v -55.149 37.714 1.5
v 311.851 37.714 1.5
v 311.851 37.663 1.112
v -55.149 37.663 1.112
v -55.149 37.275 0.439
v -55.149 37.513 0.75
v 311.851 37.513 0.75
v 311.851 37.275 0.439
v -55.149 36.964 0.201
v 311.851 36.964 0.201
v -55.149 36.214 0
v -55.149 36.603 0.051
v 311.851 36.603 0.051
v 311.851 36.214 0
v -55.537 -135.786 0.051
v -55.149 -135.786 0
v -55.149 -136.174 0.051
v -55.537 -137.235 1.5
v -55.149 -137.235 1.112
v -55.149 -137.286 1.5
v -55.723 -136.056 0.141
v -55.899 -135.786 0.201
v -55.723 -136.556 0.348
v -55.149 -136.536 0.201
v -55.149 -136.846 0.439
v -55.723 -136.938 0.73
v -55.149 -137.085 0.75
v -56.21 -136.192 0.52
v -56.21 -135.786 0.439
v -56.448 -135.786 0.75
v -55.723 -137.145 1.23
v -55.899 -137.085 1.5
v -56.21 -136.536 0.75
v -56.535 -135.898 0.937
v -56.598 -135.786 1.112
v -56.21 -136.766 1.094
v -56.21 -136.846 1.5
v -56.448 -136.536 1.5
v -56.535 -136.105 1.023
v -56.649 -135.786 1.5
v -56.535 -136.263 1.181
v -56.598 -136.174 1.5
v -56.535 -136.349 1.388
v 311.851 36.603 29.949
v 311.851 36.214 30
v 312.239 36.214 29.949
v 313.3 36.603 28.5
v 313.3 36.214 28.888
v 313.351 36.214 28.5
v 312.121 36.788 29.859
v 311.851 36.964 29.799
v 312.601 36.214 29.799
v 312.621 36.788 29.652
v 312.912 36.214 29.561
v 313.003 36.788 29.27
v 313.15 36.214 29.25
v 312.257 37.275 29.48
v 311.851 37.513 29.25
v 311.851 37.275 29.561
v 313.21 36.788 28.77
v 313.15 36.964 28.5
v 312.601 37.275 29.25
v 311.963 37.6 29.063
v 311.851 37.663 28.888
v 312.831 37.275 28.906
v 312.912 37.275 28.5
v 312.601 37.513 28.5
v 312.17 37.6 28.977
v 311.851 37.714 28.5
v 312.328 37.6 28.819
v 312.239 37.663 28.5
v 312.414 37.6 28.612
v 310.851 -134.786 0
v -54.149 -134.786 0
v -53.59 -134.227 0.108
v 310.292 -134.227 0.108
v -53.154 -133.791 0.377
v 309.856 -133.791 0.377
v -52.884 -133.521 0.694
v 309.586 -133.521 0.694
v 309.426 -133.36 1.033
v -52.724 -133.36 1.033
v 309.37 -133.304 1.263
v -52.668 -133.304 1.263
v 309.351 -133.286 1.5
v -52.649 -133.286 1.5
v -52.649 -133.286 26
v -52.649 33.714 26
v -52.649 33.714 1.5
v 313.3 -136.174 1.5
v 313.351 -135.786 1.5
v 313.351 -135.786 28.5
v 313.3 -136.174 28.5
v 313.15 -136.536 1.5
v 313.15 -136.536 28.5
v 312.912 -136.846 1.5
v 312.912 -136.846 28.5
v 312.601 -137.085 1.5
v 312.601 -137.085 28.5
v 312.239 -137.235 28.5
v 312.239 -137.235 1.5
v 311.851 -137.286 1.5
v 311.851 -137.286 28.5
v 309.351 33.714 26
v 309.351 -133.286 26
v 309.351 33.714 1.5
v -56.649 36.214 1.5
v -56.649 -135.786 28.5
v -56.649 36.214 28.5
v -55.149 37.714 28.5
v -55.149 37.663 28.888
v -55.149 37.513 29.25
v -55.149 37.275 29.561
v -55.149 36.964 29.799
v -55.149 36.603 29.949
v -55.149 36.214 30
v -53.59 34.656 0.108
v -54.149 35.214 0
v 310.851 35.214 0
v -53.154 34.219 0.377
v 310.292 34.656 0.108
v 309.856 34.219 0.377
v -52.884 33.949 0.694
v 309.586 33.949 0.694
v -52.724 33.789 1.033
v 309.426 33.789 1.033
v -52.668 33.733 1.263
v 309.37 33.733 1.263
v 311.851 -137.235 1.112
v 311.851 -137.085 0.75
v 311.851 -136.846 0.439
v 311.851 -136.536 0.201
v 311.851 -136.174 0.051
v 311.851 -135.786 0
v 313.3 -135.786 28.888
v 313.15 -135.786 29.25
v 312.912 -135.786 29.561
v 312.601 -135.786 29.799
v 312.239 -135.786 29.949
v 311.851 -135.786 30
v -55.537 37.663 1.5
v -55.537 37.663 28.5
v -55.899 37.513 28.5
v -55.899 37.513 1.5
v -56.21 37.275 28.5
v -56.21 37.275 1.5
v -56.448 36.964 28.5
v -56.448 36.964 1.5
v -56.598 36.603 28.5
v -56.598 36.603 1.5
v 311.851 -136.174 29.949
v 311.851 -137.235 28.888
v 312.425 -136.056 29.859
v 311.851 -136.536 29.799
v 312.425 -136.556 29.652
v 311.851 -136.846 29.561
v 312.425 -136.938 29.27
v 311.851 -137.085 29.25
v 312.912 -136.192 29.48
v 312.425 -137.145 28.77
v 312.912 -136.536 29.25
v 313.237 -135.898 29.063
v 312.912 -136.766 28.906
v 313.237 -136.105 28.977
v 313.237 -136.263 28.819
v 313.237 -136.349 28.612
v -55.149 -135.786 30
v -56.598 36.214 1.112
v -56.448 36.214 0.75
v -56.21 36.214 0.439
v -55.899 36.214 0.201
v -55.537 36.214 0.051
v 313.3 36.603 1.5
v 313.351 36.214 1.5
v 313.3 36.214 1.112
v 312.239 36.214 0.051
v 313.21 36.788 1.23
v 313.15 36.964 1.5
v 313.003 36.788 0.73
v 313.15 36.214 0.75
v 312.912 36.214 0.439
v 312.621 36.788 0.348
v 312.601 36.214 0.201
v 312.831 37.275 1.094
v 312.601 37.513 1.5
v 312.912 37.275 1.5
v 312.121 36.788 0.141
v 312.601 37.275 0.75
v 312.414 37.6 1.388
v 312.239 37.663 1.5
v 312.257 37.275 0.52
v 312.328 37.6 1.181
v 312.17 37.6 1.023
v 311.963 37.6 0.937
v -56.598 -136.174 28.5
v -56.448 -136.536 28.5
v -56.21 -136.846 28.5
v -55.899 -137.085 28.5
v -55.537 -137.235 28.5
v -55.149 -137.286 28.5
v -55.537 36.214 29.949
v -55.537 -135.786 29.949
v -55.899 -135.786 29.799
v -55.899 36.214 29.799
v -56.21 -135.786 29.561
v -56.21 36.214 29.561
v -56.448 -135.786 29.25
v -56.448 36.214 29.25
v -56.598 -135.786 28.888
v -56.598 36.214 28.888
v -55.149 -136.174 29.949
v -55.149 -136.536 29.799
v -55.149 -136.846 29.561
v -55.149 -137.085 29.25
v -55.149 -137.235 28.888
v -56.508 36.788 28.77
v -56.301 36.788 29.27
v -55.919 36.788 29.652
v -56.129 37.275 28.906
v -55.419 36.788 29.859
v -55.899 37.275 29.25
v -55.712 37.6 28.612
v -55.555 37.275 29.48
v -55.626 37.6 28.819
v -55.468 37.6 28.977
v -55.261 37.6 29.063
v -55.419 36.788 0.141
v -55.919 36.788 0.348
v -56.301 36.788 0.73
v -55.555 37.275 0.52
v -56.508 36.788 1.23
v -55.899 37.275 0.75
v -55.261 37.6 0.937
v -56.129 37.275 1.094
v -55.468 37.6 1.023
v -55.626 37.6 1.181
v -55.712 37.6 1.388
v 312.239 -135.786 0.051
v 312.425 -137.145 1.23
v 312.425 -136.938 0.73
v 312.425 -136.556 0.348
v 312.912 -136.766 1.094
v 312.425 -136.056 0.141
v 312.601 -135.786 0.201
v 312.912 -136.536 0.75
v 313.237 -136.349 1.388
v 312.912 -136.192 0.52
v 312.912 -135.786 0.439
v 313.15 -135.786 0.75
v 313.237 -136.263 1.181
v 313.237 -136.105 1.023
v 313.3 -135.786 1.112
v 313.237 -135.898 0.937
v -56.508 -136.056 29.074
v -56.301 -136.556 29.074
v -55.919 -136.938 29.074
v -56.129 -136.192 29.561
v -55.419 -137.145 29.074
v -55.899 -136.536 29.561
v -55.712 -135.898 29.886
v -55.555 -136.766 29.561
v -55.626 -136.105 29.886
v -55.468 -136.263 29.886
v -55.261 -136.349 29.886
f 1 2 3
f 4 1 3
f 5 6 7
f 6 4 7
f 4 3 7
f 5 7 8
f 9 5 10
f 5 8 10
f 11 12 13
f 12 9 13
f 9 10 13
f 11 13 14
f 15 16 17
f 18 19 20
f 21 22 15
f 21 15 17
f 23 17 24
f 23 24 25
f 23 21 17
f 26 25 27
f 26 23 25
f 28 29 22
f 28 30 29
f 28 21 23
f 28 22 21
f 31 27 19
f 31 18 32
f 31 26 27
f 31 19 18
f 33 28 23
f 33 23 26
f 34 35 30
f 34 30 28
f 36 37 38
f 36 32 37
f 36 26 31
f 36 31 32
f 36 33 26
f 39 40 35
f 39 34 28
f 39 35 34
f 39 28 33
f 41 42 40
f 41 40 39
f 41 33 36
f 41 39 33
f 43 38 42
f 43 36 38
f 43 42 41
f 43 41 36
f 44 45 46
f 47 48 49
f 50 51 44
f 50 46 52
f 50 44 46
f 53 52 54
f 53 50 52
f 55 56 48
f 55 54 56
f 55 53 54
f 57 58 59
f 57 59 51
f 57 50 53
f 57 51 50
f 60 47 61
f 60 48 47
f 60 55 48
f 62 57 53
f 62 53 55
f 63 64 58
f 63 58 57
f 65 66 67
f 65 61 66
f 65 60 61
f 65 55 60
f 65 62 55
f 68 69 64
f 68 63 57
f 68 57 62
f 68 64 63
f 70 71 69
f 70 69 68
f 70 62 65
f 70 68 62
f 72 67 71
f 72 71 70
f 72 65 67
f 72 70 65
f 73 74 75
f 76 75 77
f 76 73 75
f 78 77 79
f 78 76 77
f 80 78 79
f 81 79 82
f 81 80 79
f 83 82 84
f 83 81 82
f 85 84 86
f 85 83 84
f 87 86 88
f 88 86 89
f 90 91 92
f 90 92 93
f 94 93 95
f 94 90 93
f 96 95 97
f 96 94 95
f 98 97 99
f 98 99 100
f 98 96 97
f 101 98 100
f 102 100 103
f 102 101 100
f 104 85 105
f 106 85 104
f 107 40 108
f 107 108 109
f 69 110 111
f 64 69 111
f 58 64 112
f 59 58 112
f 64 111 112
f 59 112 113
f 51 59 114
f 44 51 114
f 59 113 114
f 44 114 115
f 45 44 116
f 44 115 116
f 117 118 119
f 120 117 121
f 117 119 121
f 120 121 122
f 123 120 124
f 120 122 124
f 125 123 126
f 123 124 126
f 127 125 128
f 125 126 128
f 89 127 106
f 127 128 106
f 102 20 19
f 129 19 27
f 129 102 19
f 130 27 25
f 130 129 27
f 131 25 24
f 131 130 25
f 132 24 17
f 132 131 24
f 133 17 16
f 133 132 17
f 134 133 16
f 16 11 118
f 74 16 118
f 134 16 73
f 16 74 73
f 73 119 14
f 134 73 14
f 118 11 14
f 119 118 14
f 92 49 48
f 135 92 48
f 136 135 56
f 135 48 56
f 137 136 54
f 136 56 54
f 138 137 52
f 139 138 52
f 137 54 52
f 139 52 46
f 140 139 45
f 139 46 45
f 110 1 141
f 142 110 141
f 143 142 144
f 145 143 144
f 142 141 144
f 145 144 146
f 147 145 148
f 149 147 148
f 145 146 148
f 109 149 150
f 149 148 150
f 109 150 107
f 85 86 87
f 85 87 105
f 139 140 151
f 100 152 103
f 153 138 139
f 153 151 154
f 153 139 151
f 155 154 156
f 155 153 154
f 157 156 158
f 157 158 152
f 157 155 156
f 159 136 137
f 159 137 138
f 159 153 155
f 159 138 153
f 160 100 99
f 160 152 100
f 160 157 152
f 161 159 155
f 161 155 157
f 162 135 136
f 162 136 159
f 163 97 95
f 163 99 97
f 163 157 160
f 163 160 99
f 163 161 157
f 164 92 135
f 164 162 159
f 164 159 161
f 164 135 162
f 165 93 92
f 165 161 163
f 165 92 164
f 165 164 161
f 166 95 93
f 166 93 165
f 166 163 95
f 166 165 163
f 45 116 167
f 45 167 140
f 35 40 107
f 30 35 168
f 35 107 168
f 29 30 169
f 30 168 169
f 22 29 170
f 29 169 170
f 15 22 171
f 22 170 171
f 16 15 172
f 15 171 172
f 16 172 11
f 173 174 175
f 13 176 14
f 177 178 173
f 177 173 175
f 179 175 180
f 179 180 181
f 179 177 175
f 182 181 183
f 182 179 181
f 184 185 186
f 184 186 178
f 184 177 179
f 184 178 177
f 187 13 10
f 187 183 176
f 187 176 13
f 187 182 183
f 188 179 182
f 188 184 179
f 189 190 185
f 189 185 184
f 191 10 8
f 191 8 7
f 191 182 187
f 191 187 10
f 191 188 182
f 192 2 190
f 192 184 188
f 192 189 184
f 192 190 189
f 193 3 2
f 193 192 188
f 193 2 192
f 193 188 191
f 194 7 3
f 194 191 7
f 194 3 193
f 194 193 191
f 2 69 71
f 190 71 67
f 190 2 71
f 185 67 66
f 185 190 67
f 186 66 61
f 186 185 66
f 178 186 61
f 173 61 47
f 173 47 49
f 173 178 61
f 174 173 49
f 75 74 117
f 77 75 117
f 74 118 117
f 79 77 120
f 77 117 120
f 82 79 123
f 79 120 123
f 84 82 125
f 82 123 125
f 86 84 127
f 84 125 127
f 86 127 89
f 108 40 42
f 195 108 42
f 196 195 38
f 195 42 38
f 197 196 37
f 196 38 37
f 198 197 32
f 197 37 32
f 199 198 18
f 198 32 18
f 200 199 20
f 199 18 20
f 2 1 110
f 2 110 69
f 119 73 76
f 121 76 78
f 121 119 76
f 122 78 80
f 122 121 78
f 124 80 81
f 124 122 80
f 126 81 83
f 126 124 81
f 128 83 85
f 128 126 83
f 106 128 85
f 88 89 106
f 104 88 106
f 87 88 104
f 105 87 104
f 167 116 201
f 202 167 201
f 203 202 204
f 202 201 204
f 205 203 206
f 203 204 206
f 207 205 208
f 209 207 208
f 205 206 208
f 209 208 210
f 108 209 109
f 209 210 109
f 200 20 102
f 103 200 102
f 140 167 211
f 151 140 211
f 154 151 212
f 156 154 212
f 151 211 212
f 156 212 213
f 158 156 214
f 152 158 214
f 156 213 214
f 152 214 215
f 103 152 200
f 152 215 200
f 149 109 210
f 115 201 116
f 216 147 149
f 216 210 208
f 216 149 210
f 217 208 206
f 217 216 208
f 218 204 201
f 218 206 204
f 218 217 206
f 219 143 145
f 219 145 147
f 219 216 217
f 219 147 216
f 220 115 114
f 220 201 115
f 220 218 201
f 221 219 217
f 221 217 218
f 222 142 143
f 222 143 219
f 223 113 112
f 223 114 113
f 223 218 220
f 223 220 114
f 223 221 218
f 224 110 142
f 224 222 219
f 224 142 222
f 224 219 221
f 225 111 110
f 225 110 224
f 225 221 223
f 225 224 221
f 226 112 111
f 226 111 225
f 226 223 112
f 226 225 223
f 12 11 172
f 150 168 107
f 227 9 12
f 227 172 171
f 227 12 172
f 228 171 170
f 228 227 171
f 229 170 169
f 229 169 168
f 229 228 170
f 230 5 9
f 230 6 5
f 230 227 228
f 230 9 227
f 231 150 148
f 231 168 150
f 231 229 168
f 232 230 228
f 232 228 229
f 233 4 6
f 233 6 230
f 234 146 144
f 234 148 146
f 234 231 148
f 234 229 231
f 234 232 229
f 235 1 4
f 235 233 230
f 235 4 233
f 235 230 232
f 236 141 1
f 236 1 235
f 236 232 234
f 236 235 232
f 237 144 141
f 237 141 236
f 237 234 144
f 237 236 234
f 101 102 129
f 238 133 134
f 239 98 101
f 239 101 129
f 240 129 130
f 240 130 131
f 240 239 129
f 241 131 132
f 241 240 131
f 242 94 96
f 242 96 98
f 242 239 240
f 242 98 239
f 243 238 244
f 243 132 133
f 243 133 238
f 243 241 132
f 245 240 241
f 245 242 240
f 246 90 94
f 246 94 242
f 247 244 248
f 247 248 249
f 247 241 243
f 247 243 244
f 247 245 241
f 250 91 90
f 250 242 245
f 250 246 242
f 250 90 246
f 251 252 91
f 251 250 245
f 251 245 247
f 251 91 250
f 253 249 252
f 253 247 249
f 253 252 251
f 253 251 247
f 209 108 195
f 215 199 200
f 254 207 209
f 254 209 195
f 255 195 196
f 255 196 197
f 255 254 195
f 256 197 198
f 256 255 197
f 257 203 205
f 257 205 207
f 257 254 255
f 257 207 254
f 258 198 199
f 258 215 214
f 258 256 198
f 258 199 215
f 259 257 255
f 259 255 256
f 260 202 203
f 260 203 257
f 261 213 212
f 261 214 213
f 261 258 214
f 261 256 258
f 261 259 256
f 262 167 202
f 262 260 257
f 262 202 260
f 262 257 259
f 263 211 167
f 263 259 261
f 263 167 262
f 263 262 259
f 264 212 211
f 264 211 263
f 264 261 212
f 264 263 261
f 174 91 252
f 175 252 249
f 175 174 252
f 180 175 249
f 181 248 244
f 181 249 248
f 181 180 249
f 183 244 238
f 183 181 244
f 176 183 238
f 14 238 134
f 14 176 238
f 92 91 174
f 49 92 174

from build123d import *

# Parameters (mm, degrees)
F0_W         = 370
F0_H         = 175
F1_DEPTH     = 30
F2_T         = -4
F3_R         = 1.5
F4_T1_DEPTH  = 172
F4_T3_DEPTH  = 27
F4_T5_DEPTH  = 367
F4_S9_W      = 1.5
F4_S9_H      = 1.5
F4_T10_DEPTH = 1.5
F4_S15_W     = 1.5
F4_S15_H     = 1.5
F4_T16_DEPTH = 1.5
F4_S21_W     = 1.5
F4_S21_H     = 1.5
F4_T22_DEPTH = 1.5
F4_S27_W     = 1.5
F4_S27_H     = 1.5
F4_T28_DEPTH = 1.5
F4_S33_W     = 1.5
F4_S33_H     = 1.5
F4_T34_DEPTH = 1.5
F4_S39_W     = 1.5
F4_S39_H     = 1.5
F4_T40_DEPTH = 1.5
F4_S45_W     = 1.5
F4_S45_H     = 1.5
F4_T46_DEPTH = 1.5
F4_S51_W     = 1.5
F4_S51_H     = 1.5
F4_T52_DEPTH = 1.5


# Not quite as in the source:
# - a fillet or chamfer that OpenCascade refuses, or shapes differently, is made with other operations: its cross-section is extruded or revolved along the edge and cut away or added


with BuildPart() as f1:
    # F0 (on Top) → F1 (new body)
    with BuildSketch(Plane.XY):
        with Locations((128.3509446681, -49.7856229544)):
            Rectangle(F0_W, F0_H)
    extrude(amount=F1_DEPTH)

    # F2
    f2_openings = [f1.faces().sort_by_distance(p)[0] for p in [
        (128.350945, -49.785623, 0),
    ]]
    offset(amount=F2_T, openings=f2_openings)

    # F3
    f3_edges = [f1.edges().sort_by_distance(p)[0] for p in [
        (128.350945, -137.285623, 0),
        (-56.649055, -49.785623, 0),
        (-52.649055, -49.785623, 0),
        (128.350945, -133.285623, 0),
        (128.350945, 37.714377, 0),
        (128.350945, 33.714377, 0),
        (309.350945, -49.785623, 0),
        (313.350945, -49.785623, 0),
    ]]
    fillet(f3_edges, radius=F3_R)

    # F4: fillet of radius 1.5 on 8 edges, made by hand

    # F4_s2 → F4_t1 (cut)
    with BuildSketch(Plane.XZ.offset(-36.2143770456)):
        with BuildLine():
            ThreePointArc((-55.1490553319, 30), (-56.2097155037, 29.5606601718), (-56.6490553319, 28.5))
            Line((-56.6490553319, 28.5), (-56.6490553319, 30))
            Line((-56.6490553319, 30), (-55.1490553319, 30))
        make_face()
        with BuildLine():
            ThreePointArc((313.3509446681, 28.5), (312.9116048398, 29.5606601718), (311.8509446681, 30))
            Line((311.8509446681, 30), (313.3509446681, 30))
            Line((313.3509446681, 30), (313.3509446681, 28.5))
        make_face()
    extrude(amount=F4_T1_DEPTH, mode=Mode.SUBTRACT)

    # F4_s4 → F4_t3 (cut)
    with BuildSketch(Plane.XY.offset(1.5)):
        with BuildLine():
            ThreePointArc((-55.1490553319, 37.7143770456), (-56.2097155037, 37.2750372174), (-56.6490553319, 36.2143770456))
            Line((-56.6490553319, 36.2143770456), (-56.6490553319, 37.7143770456))
            Line((-56.6490553319, 37.7143770456), (-55.1490553319, 37.7143770456))
        make_face()
        with BuildLine():
            ThreePointArc((-56.6490553319, -135.7856229544), (-56.2097155037, -136.8462831261), (-55.1490553319, -137.2856229544))
            Line((-55.1490553319, -137.2856229544), (-56.6490553319, -137.2856229544))
            Line((-56.6490553319, -137.2856229544), (-56.6490553319, -135.7856229544))
        make_face()
        with BuildLine():
            ThreePointArc((313.3509446681, -135.7856229544), (312.9116048398, -136.8462831261), (311.8509446681, -137.2856229544))
            Line((311.8509446681, -137.2856229544), (313.3509446681, -137.2856229544))
            Line((313.3509446681, -137.2856229544), (313.3509446681, -135.7856229544))
        make_face()
        with BuildLine():
            ThreePointArc((311.8509446681, 37.7143770456), (312.9116048398, 37.2750372174), (313.3509446681, 36.2143770456))
            Line((313.3509446681, 36.2143770456), (313.3509446681, 37.7143770456))
            Line((313.3509446681, 37.7143770456), (311.8509446681, 37.7143770456))
        make_face()
    extrude(amount=F4_T3_DEPTH, mode=Mode.SUBTRACT)

    # F4_s6 → F4_t5 (cut)
    with BuildSketch(Plane.YZ.offset(-55.1490553319)):
        with BuildLine():
            ThreePointArc((-135.7856229544, 30), (-136.8462831261, 29.5606601718), (-137.2856229544, 28.5))
            Line((-137.2856229544, 28.5), (-137.2856229544, 30))
            Line((-137.2856229544, 30), (-135.7856229544, 30))
        make_face()
        with BuildLine():
            ThreePointArc((37.7143770456, 28.5), (37.2750372174, 29.5606601718), (36.2143770456, 30))
            Line((36.2143770456, 30), (37.7143770456, 30))
            Line((37.7143770456, 30), (37.7143770456, 28.5))
        make_face()
    extrude(amount=F4_T5_DEPTH, mode=Mode.SUBTRACT)


with BuildPart() as f4_tool8:
    # F4_s9 → F4_t10 (new body)
    with BuildSketch(Plane.XZ.offset(-36.2143770456)):
        with Locations((312.6009446681, 0.75)):
            Rectangle(F4_S9_W, F4_S9_H)
    extrude(amount=-F4_T10_DEPTH)

    # F4_s11 → F4_t12 (revolve, cut)
    with BuildSketch(Plane(origin=(311.8509446681, 36.2143770456, 1.5), x_dir=(-0.7071067812, 0, 0.7071067812), z_dir=(-0.7071067812, 0, -0.7071067812))):
        with BuildLine():
            ThreePointArc((0, -1.5), (1.5, 0), (0, 1.5))
            Line((0, 1.5), (0, -1.5))
        make_face()
    revolve(axis=Axis((311.8509446681, 36.2143770456, 1.5), (0, 1, 0)), mode=Mode.SUBTRACT)


with BuildPart() as f1_1:
    add(f1.part)

    # F4_t7: cut F4_tool8
    add(f4_tool8.part, mode=Mode.SUBTRACT)


with BuildPart() as f4_tool14:
    # F4_s15 → F4_t16 (new body)
    with BuildSketch(Plane.YZ.offset(311.8509446681)):
        with Locations((-136.5356229544, 0.75)):
            Rectangle(F4_S15_W, F4_S15_H)
    extrude(amount=F4_T16_DEPTH)

    # F4_s17 → F4_t18 (revolve, cut)
    with BuildSketch(Plane(origin=(311.8509446681, -135.7856229544, 1.5), x_dir=(0, 0.7071067812, 0.7071067812), z_dir=(0, 0.7071067812, -0.7071067812))):
        with BuildLine():
            ThreePointArc((0, -1.5), (1.5, 0), (0, 1.5))
            Line((0, 1.5), (0, -1.5))
        make_face()
    revolve(axis=Axis((311.8509446681, -135.7856229544, 1.5), (1, 0, 0)), mode=Mode.SUBTRACT)


with BuildPart() as f1_2:
    add(f1_1.part)

    # F4_t13: cut F4_tool14
    add(f4_tool14.part, mode=Mode.SUBTRACT)


with BuildPart() as f4_tool20:
    # F4_s21 → F4_t22 (new body)
    with BuildSketch(Plane.YZ.offset(-55.1490553319)):
        with Locations((-136.5356229544, 0.75)):
            Rectangle(F4_S21_W, F4_S21_H)
    extrude(amount=-F4_T22_DEPTH)

    # F4_s23 → F4_t24 (revolve, cut)
    with BuildSketch(Plane(origin=(-55.1490553319, -135.7856229544, 1.5), x_dir=(0, 0.7071067812, 0.7071067812), z_dir=(0, -0.7071067812, 0.7071067812))):
        with BuildLine():
            ThreePointArc((0, -1.5), (1.5, 0), (0, 1.5))
            Line((0, 1.5), (0, -1.5))
        make_face()
    revolve(axis=Axis((-55.1490553319, -135.7856229544, 1.5), (-1, 0, 0)), mode=Mode.SUBTRACT)


with BuildPart() as f1_3:
    add(f1_2.part)

    # F4_t19: cut F4_tool20
    add(f4_tool20.part, mode=Mode.SUBTRACT)


with BuildPart() as f4_tool26:
    # F4_s27 → F4_t28 (new body)
    with BuildSketch(Plane.XZ.offset(-36.2143770456)):
        with Locations((-55.8990553319, 0.75)):
            Rectangle(F4_S27_W, F4_S27_H)
    extrude(amount=-F4_T28_DEPTH)

    # F4_s29 → F4_t30 (revolve, cut)
    with BuildSketch(Plane(origin=(-55.1490553319, 36.2143770456, 1.5), x_dir=(0.7071067812, 0, 0.7071067812), z_dir=(-0.7071067812, 0, 0.7071067812))):
        with BuildLine():
            ThreePointArc((0, -1.5), (1.5, 0), (0, 1.5))
            Line((0, 1.5), (0, -1.5))
        make_face()
    revolve(axis=Axis((-55.1490553319, 36.2143770456, 1.5), (0, 1, 0)), mode=Mode.SUBTRACT)


with BuildPart() as f1_4:
    add(f1_3.part)

    # F4_t25: cut F4_tool26
    add(f4_tool26.part, mode=Mode.SUBTRACT)


with BuildPart() as f4_tool32:
    # F4_s33 → F4_t34 (new body)
    with BuildSketch(Plane.XZ.offset(-36.2143770456)):
        with Locations((-55.8990553319, 29.25)):
            Rectangle(F4_S33_W, F4_S33_H)
    extrude(amount=-F4_T34_DEPTH)

    # F4_s35 → F4_t36 (revolve, cut)
    with BuildSketch(Plane(origin=(-55.1490553319, 36.2143770456, 28.5), x_dir=(0.7071067812, 0, -0.7071067812), z_dir=(0.7071067812, 0, 0.7071067812))):
        with BuildLine():
            ThreePointArc((0, -1.5), (1.5, 0), (0, 1.5))
            Line((0, 1.5), (0, -1.5))
        make_face()
    revolve(axis=Axis((-55.1490553319, 36.2143770456, 28.5), (0, 1, 0)), mode=Mode.SUBTRACT)


with BuildPart() as f1_5:
    add(f1_4.part)

    # F4_t31: cut F4_tool32
    add(f4_tool32.part, mode=Mode.SUBTRACT)


with BuildPart() as f4_tool38:
    # F4_s39 → F4_t40 (new body)
    with BuildSketch(Plane.XY.offset(28.5)):
        with Locations((-55.8990553319, -136.5356229544)):
            Rectangle(F4_S39_W, F4_S39_H)
    extrude(amount=F4_T40_DEPTH)

    # F4_s41 → F4_t42 (revolve, cut)
    with BuildSketch(Plane(origin=(-55.1490553319, -135.7856229544, 28.5), x_dir=(0.7071067812, 0.7071067812, 0), z_dir=(0.7071067812, -0.7071067812, 0))):
        with BuildLine():
            ThreePointArc((0, -1.5), (1.5, 0), (0, 1.5))
            Line((0, 1.5), (0, -1.5))
        make_face()
    revolve(axis=Axis((-55.1490553319, -135.7856229544, 28.5), (0, 0, 1)), mode=Mode.SUBTRACT)


with BuildPart() as f1_6:
    add(f1_5.part)

    # F4_t37: cut F4_tool38
    add(f4_tool38.part, mode=Mode.SUBTRACT)


with BuildPart() as f4_tool44:
    # F4_s45 → F4_t46 (new body)
    with BuildSketch(Plane.YZ.offset(311.8509446681)):
        with Locations((-136.5356229544, 29.25)):
            Rectangle(F4_S45_W, F4_S45_H)
    extrude(amount=F4_T46_DEPTH)

    # F4_s47 → F4_t48 (revolve, cut)
    with BuildSketch(Plane(origin=(311.8509446681, -135.7856229544, 28.5), x_dir=(0, 0.7071067812, -0.7071067812), z_dir=(0, -0.7071067812, -0.7071067812))):
        with BuildLine():
            ThreePointArc((0, -1.5), (1.5, 0), (0, 1.5))
            Line((0, 1.5), (0, -1.5))
        make_face()
    revolve(axis=Axis((311.8509446681, -135.7856229544, 28.5), (1, 0, 0)), mode=Mode.SUBTRACT)


with BuildPart() as f1_7:
    add(f1_6.part)

    # F4_t43: cut F4_tool44
    add(f4_tool44.part, mode=Mode.SUBTRACT)


with BuildPart() as f4_tool50:
    # F4_s51 → F4_t52 (new body)
    with BuildSketch(Plane.XZ.offset(-36.2143770456)):
        with Locations((312.6009446681, 29.25)):
            Rectangle(F4_S51_W, F4_S51_H)
    extrude(amount=-F4_T52_DEPTH)

    # F4_s53 → F4_t54 (revolve, cut)
    with BuildSketch(Plane(origin=(311.8509446681, 36.2143770456, 28.5), x_dir=(-0.7071067812, 0, -0.7071067812), z_dir=(0.7071067812, 0, -0.7071067812))):
        with BuildLine():
            ThreePointArc((0, -1.5), (1.5, 0), (0, 1.5))
            Line((0, 1.5), (0, -1.5))
        make_face()
    revolve(axis=Axis((311.8509446681, 36.2143770456, 28.5), (0, 1, 0)), mode=Mode.SUBTRACT)


with BuildPart() as f1_8:
    add(f1_7.part)

    # F4_t49: cut F4_tool50
    add(f4_tool50.part, mode=Mode.SUBTRACT)


solid = f1_8.part
